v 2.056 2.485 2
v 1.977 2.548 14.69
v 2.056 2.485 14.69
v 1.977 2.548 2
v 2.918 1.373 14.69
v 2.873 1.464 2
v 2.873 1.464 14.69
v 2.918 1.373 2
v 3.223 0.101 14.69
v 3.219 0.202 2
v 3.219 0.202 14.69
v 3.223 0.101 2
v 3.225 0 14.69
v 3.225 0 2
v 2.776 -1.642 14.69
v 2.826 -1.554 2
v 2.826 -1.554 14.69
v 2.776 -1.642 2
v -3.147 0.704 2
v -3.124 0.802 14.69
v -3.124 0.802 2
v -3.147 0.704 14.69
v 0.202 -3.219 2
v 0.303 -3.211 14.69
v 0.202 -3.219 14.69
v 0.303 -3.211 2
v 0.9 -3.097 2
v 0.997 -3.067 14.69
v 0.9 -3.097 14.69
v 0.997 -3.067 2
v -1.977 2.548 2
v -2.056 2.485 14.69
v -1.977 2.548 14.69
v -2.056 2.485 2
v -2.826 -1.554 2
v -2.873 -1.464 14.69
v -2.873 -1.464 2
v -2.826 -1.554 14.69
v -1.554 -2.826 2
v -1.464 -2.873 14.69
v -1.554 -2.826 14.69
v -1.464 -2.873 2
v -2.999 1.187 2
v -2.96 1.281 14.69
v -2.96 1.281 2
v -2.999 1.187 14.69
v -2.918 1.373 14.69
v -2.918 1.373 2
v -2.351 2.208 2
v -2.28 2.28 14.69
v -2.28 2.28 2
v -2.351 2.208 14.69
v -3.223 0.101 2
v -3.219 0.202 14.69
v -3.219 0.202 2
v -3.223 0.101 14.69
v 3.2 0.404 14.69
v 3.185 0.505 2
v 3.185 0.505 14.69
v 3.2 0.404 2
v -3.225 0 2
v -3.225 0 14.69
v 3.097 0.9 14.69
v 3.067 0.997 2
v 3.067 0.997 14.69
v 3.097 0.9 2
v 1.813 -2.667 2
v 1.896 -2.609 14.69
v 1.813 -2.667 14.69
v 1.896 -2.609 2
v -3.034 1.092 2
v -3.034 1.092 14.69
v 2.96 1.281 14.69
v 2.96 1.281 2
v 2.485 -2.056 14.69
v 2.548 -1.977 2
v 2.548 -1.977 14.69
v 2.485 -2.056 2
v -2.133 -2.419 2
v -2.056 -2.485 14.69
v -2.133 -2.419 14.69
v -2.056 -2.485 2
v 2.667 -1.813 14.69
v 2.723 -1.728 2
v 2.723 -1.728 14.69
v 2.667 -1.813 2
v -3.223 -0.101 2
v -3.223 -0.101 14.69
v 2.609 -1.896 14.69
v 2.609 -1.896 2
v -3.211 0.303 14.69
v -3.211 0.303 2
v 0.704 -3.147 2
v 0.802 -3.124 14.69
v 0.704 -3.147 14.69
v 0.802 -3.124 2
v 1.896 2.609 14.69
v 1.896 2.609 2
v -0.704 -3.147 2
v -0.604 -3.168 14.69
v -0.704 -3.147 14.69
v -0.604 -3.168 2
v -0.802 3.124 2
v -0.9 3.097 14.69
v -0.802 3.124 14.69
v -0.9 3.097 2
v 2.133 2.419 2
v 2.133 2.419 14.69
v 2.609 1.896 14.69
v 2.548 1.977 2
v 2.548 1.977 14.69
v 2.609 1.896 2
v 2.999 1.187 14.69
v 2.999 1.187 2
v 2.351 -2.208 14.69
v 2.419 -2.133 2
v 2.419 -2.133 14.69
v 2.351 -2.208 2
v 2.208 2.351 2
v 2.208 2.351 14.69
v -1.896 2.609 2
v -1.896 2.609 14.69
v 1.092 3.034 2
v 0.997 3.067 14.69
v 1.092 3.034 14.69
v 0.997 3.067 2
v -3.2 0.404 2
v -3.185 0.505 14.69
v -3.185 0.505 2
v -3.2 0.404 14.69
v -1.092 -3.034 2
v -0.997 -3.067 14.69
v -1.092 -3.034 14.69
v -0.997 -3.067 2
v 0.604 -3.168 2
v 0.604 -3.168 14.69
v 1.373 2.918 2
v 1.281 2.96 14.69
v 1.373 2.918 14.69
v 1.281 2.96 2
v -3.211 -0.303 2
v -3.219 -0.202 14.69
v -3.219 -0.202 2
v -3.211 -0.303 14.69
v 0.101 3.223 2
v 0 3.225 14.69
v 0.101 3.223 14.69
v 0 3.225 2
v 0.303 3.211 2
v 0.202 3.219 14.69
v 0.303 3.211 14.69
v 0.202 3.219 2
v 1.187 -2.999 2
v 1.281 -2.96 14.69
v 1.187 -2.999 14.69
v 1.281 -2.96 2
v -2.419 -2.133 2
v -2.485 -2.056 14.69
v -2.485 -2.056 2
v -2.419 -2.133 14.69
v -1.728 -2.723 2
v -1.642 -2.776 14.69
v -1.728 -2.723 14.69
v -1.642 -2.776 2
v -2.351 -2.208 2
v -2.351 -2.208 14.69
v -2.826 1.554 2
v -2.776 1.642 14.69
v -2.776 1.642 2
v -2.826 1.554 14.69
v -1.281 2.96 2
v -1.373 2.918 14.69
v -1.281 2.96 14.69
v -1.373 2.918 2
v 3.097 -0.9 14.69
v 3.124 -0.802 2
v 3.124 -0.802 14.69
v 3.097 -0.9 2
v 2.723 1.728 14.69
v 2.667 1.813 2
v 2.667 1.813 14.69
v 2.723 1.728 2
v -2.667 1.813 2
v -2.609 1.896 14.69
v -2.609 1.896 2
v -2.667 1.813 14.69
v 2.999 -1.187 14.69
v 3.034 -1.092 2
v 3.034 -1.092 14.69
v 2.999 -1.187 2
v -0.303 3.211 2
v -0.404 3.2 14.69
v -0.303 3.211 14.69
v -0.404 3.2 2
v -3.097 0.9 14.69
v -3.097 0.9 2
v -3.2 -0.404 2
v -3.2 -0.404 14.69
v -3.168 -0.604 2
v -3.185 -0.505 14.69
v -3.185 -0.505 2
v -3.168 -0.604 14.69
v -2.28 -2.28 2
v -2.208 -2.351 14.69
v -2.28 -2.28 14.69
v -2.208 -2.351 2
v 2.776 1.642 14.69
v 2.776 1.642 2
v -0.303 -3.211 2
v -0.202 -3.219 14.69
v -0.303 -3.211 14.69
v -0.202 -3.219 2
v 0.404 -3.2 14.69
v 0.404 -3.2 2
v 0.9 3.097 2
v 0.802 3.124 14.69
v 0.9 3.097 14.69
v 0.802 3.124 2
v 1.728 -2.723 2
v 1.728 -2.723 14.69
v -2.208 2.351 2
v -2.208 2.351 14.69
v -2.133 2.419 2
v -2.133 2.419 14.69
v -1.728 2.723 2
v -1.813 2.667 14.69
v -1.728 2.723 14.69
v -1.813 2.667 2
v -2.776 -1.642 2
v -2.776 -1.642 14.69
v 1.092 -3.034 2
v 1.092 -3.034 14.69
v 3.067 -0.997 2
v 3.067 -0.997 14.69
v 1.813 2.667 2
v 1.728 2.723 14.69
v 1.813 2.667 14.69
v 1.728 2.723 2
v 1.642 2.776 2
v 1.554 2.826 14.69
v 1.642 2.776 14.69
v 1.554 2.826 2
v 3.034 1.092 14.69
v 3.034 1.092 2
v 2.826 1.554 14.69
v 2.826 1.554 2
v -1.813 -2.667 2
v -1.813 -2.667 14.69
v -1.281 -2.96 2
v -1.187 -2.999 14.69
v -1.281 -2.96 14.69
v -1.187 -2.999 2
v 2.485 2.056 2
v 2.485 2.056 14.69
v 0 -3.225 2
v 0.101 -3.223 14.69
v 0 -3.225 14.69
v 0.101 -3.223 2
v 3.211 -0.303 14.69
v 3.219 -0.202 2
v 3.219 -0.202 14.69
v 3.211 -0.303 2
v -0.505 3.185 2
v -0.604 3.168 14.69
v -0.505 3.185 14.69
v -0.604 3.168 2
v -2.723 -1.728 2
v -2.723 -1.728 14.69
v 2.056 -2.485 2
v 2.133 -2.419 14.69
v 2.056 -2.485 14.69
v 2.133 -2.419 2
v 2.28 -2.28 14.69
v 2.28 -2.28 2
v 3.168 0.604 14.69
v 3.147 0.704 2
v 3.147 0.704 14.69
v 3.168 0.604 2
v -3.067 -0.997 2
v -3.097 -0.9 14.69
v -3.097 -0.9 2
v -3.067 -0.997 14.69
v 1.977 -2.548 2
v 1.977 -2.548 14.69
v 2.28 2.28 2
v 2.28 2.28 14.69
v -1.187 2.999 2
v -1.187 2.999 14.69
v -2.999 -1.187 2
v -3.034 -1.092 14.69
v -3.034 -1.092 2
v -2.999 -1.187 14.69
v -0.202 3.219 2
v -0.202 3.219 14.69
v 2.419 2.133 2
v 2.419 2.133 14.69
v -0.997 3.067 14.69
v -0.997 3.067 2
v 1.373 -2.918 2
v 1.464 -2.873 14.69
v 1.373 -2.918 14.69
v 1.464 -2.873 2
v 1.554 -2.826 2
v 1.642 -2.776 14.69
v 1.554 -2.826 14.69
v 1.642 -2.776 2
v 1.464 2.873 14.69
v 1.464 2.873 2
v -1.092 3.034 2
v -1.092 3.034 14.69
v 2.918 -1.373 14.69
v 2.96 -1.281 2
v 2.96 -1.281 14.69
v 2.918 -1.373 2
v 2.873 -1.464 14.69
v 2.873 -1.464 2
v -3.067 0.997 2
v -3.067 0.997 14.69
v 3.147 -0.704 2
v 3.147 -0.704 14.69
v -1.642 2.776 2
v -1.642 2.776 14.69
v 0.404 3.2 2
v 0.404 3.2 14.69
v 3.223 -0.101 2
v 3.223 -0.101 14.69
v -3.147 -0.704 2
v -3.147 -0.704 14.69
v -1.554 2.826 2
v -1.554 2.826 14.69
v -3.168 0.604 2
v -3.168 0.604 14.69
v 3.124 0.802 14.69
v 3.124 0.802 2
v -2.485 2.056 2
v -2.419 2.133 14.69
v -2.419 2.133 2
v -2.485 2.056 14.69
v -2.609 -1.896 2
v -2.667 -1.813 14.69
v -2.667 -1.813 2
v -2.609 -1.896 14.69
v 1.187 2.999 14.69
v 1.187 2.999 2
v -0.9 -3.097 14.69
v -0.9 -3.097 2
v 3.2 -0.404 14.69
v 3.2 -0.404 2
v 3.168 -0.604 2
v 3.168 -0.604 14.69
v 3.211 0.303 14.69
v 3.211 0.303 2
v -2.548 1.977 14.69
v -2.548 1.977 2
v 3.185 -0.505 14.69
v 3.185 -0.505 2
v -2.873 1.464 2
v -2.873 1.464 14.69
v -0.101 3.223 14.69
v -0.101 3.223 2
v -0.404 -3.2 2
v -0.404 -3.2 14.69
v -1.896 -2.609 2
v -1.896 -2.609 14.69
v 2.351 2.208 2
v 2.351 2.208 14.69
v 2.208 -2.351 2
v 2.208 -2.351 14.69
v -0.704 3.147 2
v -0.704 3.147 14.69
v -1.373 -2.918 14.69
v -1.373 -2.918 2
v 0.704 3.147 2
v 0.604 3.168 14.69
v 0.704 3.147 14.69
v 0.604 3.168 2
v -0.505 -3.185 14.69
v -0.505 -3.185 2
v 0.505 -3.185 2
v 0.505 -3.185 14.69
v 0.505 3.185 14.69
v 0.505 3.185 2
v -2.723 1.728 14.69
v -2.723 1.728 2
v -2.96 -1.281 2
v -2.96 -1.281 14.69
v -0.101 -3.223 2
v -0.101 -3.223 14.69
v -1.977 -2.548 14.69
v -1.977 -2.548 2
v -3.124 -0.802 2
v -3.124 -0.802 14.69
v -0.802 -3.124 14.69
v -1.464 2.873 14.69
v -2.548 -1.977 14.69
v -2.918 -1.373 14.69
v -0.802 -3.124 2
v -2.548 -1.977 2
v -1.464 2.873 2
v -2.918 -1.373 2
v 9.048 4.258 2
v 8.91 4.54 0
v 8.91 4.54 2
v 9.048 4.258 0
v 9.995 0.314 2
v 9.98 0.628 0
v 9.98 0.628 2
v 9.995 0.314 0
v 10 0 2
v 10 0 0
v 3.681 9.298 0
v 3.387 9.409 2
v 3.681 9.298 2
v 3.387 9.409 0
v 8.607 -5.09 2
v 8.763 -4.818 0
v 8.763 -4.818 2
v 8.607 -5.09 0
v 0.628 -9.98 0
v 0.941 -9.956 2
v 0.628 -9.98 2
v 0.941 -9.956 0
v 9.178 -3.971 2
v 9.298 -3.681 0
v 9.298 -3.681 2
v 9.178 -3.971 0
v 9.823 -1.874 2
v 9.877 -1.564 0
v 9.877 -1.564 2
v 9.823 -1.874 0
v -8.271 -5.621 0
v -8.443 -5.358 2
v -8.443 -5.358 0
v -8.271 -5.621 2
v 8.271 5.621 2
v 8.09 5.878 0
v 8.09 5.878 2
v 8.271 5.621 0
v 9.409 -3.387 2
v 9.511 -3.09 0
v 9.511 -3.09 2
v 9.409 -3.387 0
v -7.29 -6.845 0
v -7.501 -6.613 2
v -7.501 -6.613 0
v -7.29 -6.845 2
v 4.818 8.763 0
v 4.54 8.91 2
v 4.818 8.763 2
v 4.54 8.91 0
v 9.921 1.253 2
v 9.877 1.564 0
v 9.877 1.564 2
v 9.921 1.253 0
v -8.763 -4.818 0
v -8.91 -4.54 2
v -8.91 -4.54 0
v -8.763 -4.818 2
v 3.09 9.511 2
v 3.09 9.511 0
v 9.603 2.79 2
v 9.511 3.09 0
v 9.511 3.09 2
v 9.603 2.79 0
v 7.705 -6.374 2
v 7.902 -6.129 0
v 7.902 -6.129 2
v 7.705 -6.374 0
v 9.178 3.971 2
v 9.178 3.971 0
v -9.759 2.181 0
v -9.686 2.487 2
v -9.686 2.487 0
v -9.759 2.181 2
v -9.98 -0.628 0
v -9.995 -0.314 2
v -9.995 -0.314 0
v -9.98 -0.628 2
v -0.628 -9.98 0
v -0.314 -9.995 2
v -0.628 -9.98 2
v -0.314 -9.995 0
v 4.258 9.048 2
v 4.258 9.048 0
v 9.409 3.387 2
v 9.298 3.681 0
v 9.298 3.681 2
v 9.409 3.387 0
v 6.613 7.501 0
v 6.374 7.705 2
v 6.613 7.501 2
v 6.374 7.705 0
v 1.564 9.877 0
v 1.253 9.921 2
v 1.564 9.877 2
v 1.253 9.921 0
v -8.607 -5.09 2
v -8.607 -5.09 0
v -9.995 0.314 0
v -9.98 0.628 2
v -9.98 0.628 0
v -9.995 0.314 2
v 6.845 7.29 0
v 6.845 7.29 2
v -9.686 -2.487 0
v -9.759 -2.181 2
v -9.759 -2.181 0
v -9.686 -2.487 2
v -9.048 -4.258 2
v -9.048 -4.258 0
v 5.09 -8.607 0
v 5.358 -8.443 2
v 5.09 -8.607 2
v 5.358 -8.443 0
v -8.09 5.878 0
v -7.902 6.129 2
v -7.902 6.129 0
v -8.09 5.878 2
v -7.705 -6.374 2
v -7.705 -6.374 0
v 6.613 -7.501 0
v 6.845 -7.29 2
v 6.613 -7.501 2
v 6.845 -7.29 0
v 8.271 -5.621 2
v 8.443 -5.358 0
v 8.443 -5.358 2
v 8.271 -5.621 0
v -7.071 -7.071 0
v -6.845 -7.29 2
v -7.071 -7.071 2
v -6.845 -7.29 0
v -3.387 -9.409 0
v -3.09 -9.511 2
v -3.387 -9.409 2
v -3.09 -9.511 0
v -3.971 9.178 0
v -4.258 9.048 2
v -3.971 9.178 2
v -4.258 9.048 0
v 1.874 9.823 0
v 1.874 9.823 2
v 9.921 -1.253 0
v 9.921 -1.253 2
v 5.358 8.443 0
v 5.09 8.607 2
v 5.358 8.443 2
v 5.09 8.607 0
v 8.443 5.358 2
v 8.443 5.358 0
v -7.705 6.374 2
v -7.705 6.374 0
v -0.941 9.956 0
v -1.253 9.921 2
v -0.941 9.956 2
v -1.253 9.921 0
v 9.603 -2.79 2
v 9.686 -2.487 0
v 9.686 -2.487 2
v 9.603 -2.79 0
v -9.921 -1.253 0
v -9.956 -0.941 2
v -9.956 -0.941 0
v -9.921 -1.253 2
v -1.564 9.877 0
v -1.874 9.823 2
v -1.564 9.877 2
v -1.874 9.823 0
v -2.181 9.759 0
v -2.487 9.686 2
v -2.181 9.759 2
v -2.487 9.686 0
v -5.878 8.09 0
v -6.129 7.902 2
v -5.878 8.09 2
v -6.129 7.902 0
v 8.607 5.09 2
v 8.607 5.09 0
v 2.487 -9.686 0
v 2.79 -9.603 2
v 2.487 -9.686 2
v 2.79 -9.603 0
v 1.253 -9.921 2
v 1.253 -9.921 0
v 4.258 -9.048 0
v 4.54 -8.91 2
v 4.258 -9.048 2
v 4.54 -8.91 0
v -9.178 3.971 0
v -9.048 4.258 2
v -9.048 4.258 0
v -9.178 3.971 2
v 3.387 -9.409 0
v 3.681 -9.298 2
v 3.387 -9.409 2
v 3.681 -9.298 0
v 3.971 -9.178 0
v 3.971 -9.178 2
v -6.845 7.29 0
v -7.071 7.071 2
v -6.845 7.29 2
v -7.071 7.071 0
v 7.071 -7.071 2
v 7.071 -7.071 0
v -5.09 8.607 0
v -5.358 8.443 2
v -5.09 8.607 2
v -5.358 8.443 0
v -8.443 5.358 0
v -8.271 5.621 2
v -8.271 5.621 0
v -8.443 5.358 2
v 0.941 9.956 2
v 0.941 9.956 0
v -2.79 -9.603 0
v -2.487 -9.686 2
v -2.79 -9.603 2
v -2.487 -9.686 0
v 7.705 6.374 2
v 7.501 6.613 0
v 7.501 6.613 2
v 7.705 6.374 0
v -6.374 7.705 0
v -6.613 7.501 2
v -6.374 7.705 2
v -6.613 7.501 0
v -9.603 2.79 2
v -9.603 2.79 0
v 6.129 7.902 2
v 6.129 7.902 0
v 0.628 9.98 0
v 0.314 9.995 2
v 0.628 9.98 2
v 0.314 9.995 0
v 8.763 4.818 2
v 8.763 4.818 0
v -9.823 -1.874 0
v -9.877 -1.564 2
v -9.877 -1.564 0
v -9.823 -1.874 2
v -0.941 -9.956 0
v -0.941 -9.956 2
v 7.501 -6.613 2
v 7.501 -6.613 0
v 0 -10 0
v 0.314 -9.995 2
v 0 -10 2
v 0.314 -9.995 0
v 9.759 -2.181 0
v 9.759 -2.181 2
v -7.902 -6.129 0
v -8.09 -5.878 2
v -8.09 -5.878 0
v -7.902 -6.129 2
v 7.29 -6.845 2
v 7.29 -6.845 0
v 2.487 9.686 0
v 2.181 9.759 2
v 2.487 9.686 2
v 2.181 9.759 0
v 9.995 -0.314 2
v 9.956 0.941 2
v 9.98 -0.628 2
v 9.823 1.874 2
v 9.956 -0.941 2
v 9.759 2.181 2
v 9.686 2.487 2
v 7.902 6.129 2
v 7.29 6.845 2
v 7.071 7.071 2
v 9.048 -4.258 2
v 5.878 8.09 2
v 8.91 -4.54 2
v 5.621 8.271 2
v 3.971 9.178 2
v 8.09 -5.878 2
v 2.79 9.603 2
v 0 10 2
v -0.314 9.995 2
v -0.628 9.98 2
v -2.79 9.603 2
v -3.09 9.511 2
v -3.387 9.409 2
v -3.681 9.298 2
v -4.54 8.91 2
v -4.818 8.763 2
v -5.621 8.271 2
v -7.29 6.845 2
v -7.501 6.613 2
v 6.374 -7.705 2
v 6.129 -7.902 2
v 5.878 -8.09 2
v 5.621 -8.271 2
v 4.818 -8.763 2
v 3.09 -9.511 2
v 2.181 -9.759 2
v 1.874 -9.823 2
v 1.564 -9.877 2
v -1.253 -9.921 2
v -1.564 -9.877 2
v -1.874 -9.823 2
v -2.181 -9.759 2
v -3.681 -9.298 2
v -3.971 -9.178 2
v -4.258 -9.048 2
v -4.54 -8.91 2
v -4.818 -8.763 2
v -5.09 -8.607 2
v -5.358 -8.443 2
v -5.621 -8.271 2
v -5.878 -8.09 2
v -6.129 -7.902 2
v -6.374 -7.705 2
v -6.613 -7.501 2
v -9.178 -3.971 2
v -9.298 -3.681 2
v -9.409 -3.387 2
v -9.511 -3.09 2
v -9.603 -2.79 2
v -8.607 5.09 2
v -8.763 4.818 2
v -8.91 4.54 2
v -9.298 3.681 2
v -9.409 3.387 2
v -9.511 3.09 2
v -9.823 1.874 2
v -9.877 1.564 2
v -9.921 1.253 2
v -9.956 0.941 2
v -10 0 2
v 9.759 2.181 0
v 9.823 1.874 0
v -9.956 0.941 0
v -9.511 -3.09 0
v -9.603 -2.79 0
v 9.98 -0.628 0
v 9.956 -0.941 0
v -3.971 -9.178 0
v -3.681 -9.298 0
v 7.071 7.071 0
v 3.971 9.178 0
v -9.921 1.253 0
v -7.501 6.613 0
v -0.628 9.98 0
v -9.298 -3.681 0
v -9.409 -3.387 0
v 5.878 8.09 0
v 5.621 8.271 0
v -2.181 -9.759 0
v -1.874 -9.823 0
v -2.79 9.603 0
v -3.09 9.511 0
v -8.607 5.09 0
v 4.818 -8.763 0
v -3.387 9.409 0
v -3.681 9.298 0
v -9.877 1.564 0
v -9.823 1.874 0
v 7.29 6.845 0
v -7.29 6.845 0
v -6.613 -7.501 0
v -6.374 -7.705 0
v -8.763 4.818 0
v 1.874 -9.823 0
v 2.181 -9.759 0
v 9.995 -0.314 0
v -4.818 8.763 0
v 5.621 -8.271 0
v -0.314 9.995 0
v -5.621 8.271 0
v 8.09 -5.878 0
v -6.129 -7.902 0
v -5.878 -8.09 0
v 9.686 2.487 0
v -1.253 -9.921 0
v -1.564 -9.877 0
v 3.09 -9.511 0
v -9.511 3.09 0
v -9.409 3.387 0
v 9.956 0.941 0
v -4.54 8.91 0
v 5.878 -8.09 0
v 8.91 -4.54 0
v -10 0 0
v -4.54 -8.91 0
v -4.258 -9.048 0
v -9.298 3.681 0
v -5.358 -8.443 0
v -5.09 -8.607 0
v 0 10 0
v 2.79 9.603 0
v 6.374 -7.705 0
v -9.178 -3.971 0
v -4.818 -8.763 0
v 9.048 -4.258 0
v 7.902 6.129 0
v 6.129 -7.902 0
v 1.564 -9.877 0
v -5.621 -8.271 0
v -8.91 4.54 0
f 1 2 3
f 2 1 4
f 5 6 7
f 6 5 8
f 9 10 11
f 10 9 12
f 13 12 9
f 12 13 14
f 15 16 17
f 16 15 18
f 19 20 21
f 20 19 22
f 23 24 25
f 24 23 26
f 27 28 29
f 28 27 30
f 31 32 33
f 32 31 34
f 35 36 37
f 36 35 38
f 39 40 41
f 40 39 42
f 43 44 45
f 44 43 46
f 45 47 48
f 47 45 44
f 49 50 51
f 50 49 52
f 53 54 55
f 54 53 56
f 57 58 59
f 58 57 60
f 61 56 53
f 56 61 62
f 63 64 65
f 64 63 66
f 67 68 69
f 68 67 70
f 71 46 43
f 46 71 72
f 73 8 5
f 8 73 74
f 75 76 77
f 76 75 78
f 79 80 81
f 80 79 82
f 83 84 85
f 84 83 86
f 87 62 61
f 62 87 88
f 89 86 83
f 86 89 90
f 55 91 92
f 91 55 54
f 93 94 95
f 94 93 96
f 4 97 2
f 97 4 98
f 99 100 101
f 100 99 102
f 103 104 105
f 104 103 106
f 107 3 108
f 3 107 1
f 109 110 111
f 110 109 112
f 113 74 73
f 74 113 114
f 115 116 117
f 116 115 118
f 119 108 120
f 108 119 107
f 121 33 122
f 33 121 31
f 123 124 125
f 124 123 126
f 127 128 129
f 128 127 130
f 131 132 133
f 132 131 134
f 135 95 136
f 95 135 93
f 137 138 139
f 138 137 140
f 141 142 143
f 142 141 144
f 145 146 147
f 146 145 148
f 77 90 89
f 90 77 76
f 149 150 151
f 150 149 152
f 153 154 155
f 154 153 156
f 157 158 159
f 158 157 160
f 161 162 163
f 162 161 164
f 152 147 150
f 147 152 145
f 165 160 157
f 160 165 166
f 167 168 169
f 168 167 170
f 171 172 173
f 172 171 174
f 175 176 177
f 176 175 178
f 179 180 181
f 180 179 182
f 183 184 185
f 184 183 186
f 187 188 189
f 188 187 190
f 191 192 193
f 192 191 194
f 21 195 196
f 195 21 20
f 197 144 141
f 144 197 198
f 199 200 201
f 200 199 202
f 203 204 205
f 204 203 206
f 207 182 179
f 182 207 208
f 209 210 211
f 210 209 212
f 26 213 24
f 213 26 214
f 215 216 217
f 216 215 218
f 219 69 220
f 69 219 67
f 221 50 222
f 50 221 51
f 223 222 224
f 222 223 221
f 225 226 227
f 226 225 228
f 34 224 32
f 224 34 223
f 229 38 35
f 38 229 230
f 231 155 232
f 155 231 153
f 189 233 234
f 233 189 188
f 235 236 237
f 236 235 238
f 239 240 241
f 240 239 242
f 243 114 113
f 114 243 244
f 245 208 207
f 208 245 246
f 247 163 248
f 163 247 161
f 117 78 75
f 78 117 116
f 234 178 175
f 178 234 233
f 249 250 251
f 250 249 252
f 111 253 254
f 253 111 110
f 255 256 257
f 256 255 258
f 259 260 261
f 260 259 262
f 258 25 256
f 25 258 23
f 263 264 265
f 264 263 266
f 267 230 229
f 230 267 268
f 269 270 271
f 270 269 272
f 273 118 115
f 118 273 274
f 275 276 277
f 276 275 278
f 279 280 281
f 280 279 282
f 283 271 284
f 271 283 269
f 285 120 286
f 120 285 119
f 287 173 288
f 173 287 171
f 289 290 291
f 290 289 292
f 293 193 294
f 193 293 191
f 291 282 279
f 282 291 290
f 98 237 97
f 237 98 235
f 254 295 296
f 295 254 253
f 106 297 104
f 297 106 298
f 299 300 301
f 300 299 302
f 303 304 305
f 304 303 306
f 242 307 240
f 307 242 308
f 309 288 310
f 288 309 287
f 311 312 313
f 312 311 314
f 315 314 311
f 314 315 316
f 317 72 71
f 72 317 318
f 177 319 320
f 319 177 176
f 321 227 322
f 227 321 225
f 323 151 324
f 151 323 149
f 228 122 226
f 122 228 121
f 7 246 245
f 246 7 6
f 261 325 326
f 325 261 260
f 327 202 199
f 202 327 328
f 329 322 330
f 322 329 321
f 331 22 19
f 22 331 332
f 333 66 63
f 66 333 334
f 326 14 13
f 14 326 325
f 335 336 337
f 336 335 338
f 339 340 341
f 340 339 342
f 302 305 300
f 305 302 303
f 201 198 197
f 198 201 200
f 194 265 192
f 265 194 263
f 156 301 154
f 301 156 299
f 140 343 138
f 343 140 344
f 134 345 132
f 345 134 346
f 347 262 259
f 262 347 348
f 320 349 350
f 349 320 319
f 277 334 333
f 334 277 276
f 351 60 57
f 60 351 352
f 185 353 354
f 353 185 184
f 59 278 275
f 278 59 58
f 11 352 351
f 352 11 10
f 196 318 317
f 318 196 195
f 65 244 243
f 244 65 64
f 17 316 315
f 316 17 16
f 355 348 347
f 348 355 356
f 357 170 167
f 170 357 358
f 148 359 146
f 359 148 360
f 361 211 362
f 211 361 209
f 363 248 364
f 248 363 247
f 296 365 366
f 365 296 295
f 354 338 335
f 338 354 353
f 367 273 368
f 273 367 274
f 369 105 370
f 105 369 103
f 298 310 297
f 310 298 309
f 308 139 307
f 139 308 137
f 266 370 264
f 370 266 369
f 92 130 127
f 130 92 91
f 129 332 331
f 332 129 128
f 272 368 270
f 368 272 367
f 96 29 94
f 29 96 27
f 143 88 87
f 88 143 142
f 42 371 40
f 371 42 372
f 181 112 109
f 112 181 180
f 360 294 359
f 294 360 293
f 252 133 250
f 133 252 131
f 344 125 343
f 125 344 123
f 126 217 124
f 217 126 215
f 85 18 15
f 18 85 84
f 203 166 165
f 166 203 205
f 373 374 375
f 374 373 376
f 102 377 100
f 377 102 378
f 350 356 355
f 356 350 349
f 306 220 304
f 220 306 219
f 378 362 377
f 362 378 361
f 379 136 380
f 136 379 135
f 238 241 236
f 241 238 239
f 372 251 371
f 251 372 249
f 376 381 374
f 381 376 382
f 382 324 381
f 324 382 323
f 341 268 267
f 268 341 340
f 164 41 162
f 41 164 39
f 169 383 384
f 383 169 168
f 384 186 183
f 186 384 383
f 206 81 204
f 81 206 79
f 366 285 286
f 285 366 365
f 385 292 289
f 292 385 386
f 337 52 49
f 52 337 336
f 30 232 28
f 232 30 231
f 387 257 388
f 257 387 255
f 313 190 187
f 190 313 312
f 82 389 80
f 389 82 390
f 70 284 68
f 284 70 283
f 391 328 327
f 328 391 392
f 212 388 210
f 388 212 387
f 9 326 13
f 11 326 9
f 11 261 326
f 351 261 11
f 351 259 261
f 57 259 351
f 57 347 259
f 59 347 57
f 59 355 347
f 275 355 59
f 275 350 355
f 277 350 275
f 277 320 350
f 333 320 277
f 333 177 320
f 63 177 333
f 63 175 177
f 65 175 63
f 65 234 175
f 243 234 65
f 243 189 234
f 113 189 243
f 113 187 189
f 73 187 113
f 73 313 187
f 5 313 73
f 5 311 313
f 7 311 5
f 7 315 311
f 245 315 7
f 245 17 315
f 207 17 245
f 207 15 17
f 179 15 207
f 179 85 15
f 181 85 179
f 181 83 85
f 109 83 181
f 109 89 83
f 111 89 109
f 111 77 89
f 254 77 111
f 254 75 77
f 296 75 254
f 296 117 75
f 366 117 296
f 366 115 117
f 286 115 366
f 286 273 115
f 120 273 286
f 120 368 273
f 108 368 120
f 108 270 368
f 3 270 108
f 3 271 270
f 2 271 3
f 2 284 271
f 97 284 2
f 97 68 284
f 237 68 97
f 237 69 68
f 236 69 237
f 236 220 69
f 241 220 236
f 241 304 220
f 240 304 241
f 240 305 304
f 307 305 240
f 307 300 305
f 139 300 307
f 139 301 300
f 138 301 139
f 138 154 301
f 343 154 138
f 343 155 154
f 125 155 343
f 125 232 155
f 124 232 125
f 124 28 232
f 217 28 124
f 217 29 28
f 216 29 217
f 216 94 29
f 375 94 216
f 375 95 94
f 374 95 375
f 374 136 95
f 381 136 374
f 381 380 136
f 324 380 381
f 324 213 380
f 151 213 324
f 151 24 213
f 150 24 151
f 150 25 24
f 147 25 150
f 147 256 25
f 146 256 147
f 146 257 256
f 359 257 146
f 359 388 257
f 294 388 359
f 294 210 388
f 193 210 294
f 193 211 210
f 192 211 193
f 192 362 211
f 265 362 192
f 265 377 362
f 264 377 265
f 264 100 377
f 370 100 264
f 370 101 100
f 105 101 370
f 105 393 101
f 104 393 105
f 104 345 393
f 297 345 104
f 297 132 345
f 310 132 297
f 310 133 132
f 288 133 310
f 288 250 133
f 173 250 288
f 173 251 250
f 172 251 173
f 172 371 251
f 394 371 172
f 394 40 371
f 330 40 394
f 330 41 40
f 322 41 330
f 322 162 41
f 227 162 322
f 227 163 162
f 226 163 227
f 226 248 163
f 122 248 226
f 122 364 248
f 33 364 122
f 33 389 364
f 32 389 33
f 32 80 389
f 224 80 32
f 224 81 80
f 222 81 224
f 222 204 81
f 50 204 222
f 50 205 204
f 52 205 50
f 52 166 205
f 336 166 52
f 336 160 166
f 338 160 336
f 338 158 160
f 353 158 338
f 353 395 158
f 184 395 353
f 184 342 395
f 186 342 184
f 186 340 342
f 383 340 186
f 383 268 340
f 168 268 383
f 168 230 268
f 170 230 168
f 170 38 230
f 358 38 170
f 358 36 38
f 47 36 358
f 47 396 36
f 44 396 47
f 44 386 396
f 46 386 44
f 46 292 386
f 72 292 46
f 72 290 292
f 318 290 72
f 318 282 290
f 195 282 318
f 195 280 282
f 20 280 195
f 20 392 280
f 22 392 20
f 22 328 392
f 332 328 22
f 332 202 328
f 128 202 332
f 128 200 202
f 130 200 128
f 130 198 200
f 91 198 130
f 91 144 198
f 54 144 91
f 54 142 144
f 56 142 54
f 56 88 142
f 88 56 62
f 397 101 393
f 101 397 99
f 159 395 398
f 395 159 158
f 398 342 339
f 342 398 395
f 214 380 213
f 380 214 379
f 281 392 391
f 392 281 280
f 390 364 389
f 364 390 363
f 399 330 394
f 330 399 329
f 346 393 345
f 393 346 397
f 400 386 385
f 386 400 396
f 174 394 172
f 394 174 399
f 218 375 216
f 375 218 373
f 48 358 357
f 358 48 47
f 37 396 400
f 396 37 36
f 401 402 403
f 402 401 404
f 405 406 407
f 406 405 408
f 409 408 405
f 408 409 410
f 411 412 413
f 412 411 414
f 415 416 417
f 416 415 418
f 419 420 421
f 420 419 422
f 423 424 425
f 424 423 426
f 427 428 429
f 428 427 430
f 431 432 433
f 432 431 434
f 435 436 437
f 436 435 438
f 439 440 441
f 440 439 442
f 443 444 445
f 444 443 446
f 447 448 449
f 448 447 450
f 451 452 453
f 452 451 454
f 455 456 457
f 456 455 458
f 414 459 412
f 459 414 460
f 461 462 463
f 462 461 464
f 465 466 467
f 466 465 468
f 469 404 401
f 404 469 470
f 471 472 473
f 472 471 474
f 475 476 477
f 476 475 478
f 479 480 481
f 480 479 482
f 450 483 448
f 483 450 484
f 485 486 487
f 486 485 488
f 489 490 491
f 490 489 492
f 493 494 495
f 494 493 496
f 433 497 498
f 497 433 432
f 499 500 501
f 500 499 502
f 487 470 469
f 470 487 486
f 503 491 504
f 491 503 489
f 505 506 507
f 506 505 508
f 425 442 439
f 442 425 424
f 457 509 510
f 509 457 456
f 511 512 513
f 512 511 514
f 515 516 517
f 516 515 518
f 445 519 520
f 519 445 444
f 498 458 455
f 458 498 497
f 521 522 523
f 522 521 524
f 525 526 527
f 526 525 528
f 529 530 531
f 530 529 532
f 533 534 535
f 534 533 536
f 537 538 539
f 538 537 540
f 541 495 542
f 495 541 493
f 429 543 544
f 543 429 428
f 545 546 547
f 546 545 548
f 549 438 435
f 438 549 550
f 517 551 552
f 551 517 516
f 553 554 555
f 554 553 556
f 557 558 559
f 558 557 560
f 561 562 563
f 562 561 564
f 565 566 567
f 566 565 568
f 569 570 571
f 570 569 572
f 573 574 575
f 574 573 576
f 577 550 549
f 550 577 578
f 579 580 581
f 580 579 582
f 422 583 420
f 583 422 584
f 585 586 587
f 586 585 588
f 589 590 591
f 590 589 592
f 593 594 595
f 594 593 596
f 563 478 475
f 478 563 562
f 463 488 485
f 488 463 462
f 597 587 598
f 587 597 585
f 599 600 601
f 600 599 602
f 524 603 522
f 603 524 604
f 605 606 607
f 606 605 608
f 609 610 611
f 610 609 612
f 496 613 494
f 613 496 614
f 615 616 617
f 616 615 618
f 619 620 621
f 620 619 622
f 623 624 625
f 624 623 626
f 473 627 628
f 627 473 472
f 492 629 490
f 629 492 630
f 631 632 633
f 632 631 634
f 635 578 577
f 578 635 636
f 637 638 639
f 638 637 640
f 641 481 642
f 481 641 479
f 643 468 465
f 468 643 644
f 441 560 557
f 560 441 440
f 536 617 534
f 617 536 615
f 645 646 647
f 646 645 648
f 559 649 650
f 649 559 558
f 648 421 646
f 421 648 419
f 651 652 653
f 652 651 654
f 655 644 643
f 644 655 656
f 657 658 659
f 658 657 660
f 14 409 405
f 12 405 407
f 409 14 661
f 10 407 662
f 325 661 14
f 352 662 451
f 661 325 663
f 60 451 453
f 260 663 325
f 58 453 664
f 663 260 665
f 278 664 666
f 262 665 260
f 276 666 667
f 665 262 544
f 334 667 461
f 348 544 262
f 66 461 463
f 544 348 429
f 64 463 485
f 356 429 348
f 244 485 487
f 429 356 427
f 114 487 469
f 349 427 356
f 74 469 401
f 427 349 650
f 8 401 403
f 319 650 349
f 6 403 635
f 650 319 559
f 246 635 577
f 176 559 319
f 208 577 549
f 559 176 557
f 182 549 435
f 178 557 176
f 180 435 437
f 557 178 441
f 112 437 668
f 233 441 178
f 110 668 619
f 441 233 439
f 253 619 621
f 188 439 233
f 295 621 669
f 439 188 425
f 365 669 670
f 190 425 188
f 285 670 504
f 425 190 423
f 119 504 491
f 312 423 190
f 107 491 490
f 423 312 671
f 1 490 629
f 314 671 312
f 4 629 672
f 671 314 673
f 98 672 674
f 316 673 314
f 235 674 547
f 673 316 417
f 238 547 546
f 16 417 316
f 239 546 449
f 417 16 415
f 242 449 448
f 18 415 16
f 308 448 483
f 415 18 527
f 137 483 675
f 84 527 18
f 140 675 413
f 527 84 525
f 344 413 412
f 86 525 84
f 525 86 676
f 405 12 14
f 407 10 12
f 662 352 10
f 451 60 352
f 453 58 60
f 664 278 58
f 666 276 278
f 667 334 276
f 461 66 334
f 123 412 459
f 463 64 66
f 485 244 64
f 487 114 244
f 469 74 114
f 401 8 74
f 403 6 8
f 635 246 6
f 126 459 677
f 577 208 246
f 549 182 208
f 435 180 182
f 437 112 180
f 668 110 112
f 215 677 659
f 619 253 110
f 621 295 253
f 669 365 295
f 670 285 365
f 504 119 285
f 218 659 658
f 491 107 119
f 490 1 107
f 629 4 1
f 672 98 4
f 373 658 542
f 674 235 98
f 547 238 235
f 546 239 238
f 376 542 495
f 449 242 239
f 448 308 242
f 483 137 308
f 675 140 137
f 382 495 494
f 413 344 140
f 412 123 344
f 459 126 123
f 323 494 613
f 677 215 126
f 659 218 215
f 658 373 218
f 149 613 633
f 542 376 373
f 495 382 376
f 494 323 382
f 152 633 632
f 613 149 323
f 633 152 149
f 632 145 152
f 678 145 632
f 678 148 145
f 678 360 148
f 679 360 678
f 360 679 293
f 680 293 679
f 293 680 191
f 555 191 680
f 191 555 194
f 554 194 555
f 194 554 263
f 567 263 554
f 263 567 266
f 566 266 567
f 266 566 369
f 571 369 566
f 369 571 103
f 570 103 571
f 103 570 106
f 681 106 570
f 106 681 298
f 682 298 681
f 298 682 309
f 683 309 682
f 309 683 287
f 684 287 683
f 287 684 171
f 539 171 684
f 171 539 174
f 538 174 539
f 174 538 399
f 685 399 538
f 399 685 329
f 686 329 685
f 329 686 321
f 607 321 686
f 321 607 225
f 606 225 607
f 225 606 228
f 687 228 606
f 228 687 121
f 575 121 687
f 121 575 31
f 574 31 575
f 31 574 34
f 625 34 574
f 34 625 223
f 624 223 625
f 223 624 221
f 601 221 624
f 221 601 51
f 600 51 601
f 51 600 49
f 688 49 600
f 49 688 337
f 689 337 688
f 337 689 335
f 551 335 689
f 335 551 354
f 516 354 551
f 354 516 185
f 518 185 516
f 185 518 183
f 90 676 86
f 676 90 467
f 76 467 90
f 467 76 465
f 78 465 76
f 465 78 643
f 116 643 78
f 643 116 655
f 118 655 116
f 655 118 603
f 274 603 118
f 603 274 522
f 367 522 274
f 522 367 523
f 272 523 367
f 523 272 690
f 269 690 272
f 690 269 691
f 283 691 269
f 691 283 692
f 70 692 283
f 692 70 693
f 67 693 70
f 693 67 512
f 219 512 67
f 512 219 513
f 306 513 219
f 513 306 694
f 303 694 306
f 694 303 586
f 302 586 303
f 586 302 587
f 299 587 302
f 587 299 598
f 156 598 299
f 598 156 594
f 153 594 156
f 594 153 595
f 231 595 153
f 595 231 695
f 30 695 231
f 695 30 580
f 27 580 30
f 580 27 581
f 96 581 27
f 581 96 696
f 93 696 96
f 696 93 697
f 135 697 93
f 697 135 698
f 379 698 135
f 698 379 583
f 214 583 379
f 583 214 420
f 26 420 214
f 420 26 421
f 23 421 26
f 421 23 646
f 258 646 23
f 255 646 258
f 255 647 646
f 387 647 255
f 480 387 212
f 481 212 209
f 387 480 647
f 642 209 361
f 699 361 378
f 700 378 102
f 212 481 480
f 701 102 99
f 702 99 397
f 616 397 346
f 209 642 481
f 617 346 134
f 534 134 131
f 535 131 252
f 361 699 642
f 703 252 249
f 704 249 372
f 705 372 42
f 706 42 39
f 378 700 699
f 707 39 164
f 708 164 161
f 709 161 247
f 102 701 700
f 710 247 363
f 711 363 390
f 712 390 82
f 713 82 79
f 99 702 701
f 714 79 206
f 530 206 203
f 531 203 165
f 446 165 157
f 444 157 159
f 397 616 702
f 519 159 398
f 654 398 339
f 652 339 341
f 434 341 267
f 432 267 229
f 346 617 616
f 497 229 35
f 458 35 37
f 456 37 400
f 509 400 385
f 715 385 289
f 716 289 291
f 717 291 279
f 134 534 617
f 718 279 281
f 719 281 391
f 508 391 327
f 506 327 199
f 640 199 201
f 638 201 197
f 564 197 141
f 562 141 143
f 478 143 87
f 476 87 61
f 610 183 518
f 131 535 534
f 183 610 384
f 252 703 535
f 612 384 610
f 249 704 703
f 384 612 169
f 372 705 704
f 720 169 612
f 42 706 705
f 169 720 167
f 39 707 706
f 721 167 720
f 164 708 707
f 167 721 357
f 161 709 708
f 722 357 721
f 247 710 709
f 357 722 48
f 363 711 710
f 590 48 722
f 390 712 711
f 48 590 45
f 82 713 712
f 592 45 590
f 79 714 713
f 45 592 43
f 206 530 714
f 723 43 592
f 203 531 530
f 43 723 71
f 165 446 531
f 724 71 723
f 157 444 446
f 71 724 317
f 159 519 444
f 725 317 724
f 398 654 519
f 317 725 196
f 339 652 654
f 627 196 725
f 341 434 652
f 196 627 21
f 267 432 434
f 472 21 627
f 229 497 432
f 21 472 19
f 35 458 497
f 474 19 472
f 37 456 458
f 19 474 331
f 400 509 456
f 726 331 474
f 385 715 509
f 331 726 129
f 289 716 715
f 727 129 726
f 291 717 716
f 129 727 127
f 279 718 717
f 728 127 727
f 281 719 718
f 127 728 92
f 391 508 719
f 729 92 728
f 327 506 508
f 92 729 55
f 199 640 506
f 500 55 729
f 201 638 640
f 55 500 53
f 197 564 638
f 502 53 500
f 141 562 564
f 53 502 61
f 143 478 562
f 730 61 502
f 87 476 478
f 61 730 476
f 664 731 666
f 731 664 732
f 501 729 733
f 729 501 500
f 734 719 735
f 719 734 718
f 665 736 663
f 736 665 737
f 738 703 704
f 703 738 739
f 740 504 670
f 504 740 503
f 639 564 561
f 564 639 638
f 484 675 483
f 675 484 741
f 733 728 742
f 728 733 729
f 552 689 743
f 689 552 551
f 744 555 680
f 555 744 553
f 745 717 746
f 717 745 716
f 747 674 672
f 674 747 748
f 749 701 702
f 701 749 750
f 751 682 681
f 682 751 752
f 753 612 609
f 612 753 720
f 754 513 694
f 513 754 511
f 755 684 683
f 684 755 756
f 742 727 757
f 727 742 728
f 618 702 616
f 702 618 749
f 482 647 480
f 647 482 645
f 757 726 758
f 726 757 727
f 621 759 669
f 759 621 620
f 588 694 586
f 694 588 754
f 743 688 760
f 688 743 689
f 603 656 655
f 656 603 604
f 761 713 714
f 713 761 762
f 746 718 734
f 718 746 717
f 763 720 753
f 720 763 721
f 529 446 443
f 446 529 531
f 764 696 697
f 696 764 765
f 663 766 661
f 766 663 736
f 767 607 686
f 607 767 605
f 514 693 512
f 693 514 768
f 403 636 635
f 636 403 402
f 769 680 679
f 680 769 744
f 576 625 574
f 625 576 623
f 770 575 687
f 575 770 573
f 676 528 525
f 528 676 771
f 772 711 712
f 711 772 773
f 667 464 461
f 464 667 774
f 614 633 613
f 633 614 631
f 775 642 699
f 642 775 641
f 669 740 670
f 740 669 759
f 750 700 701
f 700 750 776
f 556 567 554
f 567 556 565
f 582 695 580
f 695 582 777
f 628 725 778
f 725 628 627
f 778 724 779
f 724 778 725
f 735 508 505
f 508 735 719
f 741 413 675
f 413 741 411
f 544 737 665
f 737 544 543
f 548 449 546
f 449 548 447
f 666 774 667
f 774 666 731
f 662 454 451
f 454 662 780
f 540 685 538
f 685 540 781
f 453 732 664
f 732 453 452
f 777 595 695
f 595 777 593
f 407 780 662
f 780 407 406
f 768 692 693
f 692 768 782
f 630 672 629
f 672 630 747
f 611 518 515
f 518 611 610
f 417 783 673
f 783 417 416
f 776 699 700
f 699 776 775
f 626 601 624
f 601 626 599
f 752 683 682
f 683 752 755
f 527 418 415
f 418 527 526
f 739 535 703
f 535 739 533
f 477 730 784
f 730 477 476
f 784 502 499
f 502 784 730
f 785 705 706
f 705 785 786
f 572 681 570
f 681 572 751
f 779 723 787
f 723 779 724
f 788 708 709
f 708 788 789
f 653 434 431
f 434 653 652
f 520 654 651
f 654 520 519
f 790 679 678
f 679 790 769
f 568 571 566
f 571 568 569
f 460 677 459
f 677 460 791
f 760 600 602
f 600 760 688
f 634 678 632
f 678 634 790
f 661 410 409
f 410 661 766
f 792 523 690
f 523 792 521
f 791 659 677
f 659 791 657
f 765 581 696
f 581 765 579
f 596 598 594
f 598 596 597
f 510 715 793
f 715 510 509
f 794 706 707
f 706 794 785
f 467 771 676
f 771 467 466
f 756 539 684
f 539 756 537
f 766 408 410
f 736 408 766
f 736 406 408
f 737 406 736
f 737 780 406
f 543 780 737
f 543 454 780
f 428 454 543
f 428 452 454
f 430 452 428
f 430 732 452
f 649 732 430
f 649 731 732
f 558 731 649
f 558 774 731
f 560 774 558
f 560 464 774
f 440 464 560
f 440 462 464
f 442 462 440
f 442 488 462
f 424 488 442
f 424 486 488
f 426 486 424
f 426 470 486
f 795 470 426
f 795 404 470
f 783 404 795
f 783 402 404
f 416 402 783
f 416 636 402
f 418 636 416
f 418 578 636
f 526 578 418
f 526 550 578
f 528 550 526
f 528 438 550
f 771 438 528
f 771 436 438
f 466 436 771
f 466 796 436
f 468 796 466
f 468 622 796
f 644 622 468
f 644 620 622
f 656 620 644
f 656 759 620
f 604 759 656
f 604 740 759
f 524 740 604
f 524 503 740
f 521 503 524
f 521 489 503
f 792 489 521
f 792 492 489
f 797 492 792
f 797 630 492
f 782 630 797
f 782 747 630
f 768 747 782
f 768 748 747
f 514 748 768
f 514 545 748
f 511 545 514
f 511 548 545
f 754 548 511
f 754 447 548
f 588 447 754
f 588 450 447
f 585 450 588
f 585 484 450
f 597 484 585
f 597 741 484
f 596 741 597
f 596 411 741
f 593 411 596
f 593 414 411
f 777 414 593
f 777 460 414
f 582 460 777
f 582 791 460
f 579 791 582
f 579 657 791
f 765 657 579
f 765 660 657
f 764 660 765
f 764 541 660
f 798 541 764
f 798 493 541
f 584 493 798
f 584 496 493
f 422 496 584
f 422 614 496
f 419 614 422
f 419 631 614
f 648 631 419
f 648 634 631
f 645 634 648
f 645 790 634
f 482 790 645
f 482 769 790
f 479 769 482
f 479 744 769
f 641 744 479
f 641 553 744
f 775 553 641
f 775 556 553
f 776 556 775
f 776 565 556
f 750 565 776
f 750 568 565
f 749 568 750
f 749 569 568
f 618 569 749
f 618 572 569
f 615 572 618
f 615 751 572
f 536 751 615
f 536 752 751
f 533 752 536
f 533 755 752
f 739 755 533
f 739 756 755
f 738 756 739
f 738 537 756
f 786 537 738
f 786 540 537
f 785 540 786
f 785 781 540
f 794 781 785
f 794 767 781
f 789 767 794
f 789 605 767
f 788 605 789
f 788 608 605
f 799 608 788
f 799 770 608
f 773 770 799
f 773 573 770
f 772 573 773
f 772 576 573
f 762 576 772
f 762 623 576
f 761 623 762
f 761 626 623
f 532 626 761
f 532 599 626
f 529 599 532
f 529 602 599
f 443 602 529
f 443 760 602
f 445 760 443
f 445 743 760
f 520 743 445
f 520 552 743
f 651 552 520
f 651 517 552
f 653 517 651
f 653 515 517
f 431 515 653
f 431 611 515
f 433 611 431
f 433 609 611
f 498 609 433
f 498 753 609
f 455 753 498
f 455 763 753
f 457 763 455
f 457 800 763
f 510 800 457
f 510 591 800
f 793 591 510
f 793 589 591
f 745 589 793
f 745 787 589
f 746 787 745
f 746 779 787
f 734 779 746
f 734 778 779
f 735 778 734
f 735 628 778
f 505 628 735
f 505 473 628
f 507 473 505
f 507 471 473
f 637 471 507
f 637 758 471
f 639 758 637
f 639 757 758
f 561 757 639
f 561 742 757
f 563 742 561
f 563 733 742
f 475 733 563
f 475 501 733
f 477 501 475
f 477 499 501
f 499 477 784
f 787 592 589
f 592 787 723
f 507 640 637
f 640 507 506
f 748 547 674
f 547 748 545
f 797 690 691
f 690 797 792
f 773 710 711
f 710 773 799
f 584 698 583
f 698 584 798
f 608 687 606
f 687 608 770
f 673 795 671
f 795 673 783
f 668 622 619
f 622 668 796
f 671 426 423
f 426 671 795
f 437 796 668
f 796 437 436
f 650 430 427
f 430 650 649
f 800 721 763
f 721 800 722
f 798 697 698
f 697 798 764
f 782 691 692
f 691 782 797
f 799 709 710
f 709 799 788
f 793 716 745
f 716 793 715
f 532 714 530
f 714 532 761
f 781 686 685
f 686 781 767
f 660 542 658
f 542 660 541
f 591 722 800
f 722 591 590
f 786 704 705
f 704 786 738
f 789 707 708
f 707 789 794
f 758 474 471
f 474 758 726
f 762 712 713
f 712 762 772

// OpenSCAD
/**
 * Hole caps, a simple configurable plug for holes. I made theses just to plug the holes in my wall because I'd rather not make a mess with drywall at the moment.
 *
 * Set the configuration parameters to what you need and print away.
 *
 * Author: ona li toki e jan Epiphany tawa mi.
 */



/**
 * Configuration parameters. Make sure to set these to what you need.
 */
// How long to make the plug-end that goes into the hole.
plugLength = 12.7;
// How wide to make the plug-end. Make sure that this is slightly smaller than the hole so it will fit.
plugDiameter = 6.45;
// How long to make the cap that goes over the hole.
capLength = 2;
// How wide to make the cap.
capDiameter = 20;
// The diameter of the hole cap's hole. Leave negative for a solid hole cap.
innerDiameter = -1;
// If true, assumes the input units are inches and converts them to millimeters for the final model. If false, assumes the input units are millimeters.
usingImperial = false;

$fn = 200;



/**
 * Performs integer to millimeter conversion.
 */
_plugLength = usingImperial ? plugLength * 25.4 : plugLength;
_plugDiameter = usingImperial ? plugDiameter * 25.4 : plugDiameter;
_capLength = usingImperial ? capLength * 25.4 : capLength;
_capDiameter = usingImperial ? capDiameter * 25.4 : capDiameter;
_innerDiameter = usingImperial ? innerDiameter * 25.4 : innerDiameter;



/**
 * Creates the hole cap.
 */
difference() {
    union() {
        epsilon = 0.01;
        
        translate([0, 0, _capLength - epsilon]) cylinder( _plugLength, d=_plugDiameter);
        cylinder(_capLength, d=_capDiameter);
    }
    
    // Generates inner hole.
    if (_innerDiameter > 0) 
        translate([0, 0, (_plugLength + _capLength) / -2]) cylinder((_plugLength + _capLength) * 2, d=_innerDiameter);
}
